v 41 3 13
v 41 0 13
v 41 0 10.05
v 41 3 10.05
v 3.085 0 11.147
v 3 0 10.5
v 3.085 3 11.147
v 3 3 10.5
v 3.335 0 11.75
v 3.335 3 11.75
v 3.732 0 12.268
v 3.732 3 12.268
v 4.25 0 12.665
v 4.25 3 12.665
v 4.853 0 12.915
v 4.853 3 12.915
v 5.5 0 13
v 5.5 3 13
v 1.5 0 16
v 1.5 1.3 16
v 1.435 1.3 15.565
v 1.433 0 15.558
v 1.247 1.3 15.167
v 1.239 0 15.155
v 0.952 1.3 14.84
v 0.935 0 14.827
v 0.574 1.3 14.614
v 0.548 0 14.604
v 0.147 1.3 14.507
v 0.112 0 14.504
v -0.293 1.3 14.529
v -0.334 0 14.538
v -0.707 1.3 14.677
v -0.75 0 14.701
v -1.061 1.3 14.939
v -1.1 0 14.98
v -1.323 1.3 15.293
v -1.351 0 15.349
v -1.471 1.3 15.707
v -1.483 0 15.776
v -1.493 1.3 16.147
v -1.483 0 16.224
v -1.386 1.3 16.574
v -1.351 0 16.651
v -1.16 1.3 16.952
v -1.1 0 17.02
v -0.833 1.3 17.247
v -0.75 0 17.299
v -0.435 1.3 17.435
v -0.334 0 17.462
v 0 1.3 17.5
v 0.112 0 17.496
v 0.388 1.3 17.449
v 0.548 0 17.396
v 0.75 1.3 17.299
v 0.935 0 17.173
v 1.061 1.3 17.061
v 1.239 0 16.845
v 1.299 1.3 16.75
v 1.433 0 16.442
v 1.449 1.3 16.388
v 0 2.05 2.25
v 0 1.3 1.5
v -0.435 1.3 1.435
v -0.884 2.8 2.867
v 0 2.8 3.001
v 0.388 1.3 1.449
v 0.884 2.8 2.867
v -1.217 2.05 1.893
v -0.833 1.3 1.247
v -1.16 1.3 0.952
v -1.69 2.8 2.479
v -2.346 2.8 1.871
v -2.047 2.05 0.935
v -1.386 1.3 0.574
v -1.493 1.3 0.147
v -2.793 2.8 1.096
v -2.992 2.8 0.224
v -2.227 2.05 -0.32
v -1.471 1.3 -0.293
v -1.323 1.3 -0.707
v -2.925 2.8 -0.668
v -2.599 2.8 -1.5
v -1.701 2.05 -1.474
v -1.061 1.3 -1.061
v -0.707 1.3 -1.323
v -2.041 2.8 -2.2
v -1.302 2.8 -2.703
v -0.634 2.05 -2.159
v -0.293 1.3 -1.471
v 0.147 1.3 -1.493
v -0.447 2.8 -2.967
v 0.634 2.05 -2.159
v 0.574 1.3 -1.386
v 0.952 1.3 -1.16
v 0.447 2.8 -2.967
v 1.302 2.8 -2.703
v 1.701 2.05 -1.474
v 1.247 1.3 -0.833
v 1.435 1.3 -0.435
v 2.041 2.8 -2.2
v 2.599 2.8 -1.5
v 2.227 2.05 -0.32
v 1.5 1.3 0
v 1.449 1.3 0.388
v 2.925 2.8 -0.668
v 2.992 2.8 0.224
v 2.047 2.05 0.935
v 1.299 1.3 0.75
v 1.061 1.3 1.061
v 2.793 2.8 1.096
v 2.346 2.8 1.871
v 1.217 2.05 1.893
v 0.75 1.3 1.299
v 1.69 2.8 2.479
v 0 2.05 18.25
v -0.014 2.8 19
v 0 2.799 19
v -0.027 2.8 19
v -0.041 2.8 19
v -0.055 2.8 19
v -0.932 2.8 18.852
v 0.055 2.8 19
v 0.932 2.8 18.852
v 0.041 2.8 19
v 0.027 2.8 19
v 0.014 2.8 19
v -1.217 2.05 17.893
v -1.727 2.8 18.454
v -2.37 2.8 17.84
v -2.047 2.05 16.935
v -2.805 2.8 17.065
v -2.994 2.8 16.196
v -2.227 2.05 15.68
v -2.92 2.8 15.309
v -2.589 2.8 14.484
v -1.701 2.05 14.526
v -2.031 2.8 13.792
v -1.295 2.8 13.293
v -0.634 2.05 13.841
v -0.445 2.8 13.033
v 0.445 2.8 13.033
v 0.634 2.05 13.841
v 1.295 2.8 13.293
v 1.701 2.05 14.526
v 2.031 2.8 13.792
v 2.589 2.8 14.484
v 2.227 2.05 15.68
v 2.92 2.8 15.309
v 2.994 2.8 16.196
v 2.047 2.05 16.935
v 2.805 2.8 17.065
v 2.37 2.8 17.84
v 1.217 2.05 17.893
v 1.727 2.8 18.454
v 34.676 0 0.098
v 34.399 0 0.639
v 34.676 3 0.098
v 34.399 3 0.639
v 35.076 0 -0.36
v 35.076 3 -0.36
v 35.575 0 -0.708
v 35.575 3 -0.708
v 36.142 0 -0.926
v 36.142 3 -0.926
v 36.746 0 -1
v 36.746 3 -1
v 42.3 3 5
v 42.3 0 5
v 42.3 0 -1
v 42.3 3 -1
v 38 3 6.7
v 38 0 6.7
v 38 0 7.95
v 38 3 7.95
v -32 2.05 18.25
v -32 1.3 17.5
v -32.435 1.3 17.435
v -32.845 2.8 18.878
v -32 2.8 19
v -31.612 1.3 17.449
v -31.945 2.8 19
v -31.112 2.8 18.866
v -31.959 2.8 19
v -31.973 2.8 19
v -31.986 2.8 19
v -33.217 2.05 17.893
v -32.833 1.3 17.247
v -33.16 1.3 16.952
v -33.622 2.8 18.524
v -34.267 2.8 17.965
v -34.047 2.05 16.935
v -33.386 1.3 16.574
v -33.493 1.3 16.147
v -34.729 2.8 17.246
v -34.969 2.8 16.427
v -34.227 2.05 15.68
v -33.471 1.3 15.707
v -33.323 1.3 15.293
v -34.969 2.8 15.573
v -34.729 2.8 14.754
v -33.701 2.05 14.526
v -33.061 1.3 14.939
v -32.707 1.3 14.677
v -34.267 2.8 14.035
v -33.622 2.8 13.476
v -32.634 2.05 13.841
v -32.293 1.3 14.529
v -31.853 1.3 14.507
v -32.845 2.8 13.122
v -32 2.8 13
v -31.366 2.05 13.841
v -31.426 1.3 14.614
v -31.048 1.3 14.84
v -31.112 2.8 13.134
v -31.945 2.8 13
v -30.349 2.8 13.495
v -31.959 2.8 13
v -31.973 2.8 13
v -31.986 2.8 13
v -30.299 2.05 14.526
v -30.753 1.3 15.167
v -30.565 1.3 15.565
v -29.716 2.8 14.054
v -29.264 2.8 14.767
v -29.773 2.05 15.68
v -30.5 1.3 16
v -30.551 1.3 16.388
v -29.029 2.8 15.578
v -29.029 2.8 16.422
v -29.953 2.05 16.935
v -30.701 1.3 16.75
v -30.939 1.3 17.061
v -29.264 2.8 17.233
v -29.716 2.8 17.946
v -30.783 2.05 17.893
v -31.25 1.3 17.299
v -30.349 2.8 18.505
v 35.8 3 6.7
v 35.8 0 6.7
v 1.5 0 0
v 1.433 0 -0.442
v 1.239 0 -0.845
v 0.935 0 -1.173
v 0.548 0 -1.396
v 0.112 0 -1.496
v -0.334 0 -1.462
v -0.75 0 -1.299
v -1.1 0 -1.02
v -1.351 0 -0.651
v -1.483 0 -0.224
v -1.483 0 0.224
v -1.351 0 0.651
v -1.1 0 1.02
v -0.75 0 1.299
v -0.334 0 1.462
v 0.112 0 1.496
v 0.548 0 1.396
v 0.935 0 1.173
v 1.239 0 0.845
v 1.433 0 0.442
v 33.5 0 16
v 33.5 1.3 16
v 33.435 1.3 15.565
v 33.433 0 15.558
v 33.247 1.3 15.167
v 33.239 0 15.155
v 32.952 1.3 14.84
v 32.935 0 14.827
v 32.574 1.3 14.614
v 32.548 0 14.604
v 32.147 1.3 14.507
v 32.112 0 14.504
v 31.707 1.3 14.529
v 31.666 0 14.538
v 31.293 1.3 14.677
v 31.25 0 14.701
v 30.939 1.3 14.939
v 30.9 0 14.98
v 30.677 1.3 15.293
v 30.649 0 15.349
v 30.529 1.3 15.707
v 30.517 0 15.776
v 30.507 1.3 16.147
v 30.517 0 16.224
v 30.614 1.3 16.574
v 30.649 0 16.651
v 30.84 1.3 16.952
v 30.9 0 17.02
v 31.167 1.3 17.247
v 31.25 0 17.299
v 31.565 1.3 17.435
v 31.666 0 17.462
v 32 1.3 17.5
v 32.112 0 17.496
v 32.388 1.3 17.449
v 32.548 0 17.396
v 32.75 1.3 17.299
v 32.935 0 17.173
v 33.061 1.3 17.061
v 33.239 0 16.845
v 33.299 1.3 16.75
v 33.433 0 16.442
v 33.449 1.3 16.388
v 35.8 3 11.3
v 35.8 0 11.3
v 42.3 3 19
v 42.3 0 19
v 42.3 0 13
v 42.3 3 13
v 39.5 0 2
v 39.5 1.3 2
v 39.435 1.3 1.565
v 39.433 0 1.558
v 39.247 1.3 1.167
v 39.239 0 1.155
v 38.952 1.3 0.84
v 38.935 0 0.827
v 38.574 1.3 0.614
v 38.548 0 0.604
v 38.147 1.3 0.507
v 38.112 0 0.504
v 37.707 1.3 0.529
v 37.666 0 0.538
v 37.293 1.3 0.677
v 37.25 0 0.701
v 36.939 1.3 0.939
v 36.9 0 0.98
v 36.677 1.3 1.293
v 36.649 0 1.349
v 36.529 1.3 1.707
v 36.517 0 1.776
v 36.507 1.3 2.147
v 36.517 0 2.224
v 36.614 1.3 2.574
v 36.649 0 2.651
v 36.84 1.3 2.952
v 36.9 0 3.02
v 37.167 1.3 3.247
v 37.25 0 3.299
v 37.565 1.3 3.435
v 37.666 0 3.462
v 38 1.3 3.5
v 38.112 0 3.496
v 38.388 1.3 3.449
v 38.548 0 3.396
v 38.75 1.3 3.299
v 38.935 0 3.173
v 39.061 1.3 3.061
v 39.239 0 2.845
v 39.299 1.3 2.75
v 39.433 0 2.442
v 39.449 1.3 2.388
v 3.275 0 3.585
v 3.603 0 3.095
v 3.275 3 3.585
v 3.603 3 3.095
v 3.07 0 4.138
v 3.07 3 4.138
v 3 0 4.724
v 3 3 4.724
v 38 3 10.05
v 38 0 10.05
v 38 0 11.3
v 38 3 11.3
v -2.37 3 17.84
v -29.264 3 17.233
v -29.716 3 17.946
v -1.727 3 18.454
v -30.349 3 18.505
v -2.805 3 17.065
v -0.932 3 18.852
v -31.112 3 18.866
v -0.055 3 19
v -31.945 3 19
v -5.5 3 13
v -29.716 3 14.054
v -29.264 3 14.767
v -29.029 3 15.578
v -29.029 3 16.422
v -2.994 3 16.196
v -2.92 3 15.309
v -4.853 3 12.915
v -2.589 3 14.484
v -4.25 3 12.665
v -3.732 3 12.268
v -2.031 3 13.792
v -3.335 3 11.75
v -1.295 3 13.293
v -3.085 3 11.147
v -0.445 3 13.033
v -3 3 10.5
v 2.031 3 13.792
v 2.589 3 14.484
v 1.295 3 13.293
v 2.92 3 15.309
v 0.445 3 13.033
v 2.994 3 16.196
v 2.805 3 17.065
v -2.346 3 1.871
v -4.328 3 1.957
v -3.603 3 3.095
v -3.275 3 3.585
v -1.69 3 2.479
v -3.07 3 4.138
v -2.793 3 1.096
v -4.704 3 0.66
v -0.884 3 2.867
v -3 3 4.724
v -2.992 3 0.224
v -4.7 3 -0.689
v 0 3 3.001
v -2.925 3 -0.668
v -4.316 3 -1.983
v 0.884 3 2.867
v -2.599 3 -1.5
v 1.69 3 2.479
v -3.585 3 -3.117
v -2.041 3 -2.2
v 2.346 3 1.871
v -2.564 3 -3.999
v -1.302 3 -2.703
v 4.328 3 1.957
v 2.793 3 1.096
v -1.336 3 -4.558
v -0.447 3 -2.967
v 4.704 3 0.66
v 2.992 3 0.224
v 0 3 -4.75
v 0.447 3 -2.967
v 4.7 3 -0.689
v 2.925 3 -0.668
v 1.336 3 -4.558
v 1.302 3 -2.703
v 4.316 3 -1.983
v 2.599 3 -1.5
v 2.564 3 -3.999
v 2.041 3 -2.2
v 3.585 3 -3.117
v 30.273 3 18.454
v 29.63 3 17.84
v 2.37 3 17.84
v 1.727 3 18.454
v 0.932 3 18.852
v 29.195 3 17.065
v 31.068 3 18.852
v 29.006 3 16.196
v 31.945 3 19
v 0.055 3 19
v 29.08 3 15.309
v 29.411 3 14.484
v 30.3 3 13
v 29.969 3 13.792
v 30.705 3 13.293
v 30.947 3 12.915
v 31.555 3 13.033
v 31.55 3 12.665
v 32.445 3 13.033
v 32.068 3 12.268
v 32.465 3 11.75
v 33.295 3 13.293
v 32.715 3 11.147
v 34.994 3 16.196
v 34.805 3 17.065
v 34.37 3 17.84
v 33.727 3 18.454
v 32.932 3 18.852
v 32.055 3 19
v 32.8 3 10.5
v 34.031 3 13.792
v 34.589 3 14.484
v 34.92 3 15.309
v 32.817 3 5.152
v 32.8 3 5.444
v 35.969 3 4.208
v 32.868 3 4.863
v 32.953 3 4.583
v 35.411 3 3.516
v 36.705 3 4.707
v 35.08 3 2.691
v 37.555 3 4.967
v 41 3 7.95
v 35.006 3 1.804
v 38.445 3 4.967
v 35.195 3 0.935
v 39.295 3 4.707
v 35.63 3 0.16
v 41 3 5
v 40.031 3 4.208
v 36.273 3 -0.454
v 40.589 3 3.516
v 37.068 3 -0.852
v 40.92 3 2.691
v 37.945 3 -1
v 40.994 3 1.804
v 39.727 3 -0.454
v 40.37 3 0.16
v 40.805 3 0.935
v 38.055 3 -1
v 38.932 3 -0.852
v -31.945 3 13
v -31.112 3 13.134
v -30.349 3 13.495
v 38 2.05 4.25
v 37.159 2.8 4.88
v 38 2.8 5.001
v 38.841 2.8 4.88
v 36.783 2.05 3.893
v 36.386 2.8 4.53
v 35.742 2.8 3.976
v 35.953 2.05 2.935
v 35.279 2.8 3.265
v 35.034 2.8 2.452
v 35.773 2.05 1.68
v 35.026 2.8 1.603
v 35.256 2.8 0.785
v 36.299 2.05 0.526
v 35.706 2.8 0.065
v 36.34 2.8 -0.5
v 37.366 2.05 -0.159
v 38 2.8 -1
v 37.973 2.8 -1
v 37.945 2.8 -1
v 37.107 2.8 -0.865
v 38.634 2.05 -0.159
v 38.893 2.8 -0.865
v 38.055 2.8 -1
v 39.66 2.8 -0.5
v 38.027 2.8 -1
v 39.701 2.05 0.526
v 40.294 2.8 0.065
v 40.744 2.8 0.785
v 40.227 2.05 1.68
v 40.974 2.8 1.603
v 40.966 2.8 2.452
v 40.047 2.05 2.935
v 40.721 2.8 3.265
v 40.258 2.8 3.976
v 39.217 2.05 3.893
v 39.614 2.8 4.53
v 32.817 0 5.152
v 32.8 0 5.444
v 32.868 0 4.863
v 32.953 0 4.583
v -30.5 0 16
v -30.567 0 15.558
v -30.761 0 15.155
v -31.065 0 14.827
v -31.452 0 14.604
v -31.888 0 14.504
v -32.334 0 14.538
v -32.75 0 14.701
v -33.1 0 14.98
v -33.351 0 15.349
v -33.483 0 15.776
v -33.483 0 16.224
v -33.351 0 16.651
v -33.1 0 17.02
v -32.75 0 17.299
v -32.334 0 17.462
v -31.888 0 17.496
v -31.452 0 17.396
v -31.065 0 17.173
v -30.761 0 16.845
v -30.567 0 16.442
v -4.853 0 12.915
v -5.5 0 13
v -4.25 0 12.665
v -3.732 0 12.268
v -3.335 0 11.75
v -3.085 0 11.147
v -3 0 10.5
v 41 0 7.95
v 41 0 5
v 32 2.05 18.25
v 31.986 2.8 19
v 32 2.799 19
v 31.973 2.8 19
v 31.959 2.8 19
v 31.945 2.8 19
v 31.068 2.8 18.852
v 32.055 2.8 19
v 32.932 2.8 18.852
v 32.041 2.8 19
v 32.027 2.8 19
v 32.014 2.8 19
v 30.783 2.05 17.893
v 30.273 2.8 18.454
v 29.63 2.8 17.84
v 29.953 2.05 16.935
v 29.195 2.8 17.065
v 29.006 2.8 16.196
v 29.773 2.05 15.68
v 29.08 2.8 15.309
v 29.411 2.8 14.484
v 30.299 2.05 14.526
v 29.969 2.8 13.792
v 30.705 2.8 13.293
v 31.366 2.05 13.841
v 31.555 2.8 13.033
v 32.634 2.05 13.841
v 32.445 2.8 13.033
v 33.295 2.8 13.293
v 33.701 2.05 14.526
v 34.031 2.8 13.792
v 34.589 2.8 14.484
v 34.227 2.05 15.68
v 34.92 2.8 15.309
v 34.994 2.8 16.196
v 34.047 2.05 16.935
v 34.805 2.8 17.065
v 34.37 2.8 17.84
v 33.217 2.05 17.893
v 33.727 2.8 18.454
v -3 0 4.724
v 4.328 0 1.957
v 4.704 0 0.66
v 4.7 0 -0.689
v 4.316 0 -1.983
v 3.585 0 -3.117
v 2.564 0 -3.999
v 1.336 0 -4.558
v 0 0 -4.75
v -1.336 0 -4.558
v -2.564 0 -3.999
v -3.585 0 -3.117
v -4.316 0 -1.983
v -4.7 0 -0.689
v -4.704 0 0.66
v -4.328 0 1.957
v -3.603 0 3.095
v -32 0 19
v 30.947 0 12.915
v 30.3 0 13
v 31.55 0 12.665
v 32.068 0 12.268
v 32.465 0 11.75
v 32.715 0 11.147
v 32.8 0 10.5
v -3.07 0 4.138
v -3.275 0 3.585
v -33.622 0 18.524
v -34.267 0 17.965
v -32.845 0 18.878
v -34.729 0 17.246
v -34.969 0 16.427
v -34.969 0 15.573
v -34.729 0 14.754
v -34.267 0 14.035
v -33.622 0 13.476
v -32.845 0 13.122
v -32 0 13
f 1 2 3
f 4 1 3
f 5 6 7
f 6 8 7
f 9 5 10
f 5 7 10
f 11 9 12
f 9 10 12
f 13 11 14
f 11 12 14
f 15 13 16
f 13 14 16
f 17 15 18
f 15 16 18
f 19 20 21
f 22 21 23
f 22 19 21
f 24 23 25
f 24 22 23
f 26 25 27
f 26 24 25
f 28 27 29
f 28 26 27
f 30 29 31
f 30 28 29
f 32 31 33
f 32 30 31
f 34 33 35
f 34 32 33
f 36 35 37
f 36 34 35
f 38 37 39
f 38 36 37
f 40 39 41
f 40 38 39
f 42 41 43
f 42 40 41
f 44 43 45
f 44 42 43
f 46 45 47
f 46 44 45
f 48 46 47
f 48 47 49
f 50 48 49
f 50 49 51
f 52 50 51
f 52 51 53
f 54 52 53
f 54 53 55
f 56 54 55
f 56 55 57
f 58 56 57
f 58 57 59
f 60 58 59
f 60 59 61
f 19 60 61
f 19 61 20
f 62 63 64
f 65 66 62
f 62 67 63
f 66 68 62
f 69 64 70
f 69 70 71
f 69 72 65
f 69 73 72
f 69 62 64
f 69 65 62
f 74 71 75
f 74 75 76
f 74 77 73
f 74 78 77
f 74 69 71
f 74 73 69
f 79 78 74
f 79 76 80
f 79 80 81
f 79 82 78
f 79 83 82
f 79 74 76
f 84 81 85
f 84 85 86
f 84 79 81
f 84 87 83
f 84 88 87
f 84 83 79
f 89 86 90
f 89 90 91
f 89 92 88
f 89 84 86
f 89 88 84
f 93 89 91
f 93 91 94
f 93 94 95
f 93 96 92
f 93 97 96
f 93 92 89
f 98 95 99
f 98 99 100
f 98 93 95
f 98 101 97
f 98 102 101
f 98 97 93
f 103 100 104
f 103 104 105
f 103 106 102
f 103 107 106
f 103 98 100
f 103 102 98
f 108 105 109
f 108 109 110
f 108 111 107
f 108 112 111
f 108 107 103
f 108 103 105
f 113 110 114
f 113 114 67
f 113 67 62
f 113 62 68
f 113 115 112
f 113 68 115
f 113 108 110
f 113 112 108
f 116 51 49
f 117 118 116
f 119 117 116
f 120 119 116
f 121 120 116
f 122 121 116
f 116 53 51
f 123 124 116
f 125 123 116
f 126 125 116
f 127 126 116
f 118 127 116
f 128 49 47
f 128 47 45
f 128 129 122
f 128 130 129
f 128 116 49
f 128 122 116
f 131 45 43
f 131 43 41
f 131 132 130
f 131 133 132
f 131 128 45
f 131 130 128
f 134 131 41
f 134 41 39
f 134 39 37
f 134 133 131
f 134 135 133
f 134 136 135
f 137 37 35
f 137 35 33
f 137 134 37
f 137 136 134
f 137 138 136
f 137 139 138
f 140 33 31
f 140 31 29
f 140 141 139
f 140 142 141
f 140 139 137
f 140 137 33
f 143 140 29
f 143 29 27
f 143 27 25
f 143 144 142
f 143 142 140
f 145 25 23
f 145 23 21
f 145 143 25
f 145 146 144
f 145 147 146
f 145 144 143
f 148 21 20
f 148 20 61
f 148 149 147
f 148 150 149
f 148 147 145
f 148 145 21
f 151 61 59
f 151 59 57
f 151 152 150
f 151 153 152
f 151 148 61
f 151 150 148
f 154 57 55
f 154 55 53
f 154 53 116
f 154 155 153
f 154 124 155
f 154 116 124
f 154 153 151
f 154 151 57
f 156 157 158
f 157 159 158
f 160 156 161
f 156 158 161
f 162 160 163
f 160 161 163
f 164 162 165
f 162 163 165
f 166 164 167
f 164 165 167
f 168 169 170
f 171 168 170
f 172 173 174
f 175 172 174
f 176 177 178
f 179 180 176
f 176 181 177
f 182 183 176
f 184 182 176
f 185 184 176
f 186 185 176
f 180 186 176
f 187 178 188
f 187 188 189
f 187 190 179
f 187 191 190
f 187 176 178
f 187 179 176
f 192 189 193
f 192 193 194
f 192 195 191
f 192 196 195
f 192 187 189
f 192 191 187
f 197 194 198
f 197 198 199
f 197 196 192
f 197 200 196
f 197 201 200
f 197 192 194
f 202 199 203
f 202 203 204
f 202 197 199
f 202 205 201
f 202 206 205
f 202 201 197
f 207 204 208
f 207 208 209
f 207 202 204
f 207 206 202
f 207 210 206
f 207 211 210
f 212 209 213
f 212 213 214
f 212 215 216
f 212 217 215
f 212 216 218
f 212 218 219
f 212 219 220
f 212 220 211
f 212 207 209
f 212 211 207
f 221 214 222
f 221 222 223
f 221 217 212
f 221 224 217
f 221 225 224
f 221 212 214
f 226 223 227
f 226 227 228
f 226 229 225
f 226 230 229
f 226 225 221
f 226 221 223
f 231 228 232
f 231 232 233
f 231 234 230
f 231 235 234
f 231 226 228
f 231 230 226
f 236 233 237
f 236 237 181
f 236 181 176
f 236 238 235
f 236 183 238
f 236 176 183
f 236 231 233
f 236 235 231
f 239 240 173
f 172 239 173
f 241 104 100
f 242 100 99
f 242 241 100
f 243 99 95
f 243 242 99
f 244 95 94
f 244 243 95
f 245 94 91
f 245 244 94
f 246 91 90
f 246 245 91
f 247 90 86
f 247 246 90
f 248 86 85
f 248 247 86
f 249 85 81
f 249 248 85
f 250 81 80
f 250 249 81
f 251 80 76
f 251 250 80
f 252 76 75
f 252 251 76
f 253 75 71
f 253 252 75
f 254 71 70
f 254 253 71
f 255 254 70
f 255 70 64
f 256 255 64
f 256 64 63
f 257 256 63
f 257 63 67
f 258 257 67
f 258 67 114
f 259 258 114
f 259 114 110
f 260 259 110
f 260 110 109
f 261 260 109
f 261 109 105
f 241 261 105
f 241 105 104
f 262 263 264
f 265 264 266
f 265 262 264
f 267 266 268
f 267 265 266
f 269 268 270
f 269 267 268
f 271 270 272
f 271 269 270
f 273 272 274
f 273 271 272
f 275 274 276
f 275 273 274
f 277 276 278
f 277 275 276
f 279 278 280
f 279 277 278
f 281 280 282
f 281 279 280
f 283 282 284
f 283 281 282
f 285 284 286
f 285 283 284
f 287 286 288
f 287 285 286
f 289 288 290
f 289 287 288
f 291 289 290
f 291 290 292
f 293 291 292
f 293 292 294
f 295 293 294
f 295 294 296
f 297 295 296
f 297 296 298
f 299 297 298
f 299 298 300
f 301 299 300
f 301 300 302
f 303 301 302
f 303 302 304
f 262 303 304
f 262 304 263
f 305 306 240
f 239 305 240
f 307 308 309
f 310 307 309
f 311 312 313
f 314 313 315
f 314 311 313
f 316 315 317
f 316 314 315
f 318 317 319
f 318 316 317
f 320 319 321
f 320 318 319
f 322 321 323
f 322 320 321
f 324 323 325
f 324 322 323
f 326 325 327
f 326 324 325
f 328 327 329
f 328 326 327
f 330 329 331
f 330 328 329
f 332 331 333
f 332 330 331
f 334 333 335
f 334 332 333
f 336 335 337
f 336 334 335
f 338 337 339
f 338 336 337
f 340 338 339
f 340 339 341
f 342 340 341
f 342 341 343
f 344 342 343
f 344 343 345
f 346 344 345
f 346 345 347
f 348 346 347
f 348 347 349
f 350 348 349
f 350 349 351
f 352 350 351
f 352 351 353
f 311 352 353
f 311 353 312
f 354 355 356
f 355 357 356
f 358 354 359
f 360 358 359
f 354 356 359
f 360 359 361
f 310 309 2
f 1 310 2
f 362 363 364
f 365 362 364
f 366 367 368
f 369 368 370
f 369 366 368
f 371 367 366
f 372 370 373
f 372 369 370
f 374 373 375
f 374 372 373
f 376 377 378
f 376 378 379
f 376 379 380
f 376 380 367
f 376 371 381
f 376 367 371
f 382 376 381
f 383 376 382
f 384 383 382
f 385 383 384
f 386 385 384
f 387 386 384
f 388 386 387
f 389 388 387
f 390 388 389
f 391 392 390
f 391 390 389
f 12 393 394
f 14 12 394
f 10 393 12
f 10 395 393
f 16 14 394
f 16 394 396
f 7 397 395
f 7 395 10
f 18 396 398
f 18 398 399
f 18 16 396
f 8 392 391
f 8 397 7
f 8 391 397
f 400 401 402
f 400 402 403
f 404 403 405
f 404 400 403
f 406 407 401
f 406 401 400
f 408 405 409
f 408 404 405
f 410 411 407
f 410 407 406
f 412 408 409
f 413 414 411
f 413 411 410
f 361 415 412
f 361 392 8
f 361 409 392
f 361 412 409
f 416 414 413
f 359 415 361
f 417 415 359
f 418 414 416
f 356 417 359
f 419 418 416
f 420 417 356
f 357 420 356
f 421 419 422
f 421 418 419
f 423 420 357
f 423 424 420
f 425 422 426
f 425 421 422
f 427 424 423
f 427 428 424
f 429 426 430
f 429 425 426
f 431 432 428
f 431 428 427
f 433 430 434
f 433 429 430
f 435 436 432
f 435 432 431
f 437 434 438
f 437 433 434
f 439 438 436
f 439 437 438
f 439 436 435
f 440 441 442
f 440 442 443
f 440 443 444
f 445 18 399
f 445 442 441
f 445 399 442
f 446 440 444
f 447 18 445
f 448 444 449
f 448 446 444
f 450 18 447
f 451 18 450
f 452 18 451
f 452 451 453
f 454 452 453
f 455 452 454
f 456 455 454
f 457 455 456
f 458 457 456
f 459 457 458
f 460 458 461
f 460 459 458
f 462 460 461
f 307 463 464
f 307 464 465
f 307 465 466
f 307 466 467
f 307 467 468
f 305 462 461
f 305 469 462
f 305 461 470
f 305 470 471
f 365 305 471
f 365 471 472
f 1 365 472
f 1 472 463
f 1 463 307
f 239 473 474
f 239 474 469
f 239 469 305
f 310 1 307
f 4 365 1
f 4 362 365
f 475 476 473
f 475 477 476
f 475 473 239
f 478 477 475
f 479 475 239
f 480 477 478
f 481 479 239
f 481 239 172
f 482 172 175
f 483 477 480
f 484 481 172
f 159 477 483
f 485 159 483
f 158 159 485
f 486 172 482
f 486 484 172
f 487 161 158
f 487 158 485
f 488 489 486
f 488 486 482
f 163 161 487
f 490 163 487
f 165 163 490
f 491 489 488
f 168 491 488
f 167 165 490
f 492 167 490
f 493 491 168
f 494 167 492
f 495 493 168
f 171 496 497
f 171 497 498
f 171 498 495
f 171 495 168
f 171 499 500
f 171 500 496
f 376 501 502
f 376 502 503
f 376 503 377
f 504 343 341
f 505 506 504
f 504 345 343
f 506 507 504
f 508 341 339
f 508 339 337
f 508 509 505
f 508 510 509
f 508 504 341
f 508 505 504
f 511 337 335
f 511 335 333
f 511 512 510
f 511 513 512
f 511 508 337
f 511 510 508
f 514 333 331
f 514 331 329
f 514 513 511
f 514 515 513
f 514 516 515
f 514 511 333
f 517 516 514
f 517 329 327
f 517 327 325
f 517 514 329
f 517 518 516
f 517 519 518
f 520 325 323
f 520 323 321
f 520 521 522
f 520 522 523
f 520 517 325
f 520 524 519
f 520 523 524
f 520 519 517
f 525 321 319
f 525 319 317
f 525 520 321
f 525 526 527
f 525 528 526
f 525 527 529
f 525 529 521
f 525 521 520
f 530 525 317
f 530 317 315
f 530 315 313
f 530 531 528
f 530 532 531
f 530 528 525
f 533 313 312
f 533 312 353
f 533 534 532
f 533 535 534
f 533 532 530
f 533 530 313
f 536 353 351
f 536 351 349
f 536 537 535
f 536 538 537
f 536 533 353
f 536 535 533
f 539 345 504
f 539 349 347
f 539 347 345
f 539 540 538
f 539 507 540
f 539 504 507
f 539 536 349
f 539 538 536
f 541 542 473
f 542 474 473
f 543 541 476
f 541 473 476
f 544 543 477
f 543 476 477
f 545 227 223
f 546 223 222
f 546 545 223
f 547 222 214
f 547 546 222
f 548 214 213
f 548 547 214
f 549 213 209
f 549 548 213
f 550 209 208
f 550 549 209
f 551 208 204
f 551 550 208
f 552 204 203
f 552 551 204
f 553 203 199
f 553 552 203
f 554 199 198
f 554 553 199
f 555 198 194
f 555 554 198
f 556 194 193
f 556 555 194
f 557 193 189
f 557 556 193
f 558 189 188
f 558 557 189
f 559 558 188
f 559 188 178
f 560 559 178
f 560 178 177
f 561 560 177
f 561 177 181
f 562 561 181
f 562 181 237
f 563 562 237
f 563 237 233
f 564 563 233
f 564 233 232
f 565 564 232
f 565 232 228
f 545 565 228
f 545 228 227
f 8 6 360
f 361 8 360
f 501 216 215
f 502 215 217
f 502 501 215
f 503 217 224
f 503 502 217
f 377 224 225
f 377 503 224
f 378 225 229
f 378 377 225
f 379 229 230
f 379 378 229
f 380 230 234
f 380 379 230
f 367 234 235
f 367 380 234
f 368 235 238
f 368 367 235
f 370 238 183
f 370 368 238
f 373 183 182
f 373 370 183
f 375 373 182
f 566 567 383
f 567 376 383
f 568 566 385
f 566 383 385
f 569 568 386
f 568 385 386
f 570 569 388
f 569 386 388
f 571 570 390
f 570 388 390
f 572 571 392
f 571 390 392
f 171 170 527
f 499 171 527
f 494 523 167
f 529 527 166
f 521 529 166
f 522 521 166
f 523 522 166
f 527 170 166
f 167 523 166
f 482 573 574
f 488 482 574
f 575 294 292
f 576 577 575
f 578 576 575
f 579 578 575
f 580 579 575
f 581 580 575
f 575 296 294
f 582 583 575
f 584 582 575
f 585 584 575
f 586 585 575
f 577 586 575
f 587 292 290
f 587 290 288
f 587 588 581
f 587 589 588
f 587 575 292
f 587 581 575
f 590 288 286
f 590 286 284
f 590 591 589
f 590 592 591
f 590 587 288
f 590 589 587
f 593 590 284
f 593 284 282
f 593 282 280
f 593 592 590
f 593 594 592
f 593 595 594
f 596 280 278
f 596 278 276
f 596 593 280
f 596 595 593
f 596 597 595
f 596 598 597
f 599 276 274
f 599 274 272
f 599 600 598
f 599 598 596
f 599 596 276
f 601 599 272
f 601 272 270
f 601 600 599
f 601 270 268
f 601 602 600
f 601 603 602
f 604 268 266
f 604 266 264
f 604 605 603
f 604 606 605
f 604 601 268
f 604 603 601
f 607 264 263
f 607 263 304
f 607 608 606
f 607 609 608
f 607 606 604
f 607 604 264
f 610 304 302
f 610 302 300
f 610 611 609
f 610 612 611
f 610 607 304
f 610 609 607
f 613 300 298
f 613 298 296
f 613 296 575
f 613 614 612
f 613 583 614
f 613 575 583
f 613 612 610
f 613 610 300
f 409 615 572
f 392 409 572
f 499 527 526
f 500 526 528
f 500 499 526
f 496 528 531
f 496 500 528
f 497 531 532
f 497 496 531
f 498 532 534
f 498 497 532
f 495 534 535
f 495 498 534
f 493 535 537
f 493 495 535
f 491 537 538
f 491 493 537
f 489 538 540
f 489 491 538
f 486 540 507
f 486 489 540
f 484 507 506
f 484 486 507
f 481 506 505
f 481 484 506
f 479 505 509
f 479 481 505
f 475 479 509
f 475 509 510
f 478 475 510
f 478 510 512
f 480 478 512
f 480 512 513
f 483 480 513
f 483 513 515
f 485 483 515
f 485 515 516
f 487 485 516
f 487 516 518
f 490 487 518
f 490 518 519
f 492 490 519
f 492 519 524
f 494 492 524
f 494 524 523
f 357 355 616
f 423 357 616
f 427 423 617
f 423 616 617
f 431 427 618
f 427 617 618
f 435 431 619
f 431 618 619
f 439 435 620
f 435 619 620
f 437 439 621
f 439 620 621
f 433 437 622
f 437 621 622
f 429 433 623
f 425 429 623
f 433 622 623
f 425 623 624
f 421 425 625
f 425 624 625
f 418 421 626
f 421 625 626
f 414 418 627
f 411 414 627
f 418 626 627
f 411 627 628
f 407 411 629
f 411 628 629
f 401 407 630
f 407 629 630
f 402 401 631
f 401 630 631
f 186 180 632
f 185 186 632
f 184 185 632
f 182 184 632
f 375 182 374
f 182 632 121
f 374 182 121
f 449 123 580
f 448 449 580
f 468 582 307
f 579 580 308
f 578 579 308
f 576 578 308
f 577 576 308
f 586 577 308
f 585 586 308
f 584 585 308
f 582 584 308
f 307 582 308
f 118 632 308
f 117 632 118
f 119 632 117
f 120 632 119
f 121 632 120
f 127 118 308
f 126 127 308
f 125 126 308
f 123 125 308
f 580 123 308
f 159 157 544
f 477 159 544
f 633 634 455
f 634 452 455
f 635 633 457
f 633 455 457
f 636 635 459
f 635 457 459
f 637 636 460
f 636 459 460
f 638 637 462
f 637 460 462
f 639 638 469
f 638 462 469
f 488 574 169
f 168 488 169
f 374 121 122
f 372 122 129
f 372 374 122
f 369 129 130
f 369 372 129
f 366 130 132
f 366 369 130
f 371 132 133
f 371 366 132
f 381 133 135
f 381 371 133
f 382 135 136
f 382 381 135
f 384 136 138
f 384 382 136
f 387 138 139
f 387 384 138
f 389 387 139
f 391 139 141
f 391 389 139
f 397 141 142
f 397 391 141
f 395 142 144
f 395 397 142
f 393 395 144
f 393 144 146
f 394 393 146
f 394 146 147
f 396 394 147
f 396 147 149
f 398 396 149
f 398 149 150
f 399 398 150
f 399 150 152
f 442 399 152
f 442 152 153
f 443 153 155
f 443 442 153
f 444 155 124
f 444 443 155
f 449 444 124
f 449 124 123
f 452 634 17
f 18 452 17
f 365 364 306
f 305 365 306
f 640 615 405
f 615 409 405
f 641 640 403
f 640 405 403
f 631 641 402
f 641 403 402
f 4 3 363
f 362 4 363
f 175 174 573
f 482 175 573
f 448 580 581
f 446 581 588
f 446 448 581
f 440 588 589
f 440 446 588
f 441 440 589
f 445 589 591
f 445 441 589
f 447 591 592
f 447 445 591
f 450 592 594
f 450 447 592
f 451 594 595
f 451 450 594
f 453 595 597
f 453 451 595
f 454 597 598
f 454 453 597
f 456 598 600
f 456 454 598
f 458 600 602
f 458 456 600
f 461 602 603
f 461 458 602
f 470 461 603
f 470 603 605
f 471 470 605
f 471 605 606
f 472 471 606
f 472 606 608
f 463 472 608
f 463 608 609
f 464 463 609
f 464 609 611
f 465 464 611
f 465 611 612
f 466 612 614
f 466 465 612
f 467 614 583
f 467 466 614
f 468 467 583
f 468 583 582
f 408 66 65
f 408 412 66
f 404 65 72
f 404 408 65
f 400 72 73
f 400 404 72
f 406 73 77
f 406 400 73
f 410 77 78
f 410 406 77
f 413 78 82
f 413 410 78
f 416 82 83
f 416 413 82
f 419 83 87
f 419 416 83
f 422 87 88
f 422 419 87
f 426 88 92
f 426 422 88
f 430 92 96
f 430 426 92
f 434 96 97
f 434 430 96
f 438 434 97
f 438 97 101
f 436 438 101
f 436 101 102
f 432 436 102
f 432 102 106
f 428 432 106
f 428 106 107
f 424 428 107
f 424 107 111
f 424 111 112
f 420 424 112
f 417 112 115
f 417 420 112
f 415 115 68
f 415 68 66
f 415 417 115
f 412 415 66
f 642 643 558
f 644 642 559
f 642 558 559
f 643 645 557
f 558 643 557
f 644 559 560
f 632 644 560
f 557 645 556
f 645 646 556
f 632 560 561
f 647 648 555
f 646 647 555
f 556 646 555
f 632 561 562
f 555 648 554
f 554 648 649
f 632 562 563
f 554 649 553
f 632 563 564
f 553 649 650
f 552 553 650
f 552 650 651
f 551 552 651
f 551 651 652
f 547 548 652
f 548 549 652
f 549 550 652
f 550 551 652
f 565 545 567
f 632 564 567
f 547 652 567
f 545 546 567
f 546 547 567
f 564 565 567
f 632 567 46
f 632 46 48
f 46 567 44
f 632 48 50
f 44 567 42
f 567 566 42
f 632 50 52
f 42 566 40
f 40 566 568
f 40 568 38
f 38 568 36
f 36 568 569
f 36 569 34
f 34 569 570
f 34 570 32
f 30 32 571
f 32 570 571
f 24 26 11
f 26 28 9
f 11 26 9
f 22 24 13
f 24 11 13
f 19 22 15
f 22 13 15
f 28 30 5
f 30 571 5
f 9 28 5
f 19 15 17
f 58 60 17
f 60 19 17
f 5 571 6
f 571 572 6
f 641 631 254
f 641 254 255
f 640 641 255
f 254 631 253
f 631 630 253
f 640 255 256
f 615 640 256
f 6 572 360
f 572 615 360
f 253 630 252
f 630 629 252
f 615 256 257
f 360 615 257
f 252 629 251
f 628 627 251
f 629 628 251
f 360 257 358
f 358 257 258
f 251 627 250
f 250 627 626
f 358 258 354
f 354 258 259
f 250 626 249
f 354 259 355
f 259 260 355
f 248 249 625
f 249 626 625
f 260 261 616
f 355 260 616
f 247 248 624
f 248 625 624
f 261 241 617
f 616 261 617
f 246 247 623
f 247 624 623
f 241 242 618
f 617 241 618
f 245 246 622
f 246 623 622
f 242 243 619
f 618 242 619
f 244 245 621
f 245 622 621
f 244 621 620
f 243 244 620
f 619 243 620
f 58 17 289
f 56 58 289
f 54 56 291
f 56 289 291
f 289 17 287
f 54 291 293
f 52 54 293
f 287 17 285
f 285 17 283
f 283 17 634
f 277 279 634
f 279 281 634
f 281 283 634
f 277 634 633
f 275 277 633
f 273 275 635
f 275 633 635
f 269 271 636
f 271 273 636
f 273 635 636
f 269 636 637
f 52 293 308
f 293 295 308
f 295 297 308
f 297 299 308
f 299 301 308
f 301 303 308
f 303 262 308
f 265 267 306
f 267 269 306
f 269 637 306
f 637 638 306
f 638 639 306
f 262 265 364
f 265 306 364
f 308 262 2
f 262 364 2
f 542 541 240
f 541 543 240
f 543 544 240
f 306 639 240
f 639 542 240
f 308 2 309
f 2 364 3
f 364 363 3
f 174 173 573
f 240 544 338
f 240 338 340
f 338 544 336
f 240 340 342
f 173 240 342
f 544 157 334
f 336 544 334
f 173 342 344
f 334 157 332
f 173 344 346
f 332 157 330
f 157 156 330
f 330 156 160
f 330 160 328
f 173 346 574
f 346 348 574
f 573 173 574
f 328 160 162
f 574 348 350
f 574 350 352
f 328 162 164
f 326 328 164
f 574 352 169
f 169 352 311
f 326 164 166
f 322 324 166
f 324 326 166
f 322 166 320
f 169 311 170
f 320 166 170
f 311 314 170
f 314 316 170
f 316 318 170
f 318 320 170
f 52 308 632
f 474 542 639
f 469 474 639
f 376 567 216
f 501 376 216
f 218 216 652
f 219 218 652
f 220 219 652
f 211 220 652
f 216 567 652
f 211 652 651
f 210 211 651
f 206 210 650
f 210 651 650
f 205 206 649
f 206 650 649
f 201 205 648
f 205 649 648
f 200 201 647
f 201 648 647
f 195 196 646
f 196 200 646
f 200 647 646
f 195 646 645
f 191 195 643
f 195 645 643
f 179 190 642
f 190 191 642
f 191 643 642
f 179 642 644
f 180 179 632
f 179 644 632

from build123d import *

# Parameters (mm, degrees)
SKETCH1_R                                      = 1.5
BOSS_EXTRUDE1_DEPTH                            = 3
FILLET1_R                                      = 2.5
CSK_FOR_M3_FLAT_HEAD_MACHINE_SCREW3_AT_2_COUNT = 2
CSK_FOR_M3_FLAT_HEAD_MACHINE_SCREW3_AT_2_PITCH = 32
CSK_FOR_M3_FLAT_HEAD_MACHINE_SCREW3_AT_3_COUNT = 2
CSK_FOR_M3_FLAT_HEAD_MACHINE_SCREW3_AT_3_PITCH = 71.38627319
CSK_FOR_M3_FLAT_HEAD_MACHINE_SCREW3_AT_4_COUNT = 2
CSK_FOR_M3_FLAT_HEAD_MACHINE_SCREW3_AT_4_PITCH = 35.77708764
CSK_FOR_M3_FLAT_HEAD_MACHINE_SCREW3_AT_5_COUNT = 2
CSK_FOR_M3_FLAT_HEAD_MACHINE_SCREW3_AT_5_PITCH = 64


with BuildPart() as part:
    # Sketch1 → Boss-Extrude1 (new body)
    with BuildSketch(Plane(origin=(0, 0, 0), x_dir=(1, 0, 0), z_dir=(0, 1, 0))):
        with BuildLine():
            Line((-3, -13), (-32, -13))
            ThreePointArc((-32, -13), (-35, -16), (-32, -19))
            Line((-32, -19), (42.3, -19))
            Line((42.3, -19), (42.3, -13))
            Line((42.3, -13), (41, -13))
            Line((41, -13), (41, -10.05))
            Line((41, -10.05), (38, -10.05))
            Line((38, -10.05), (38, -11.3))
            Line((38, -11.3), (35.8, -11.3))
            Line((35.8, -11.3), (35.8, -6.7))
            Line((35.8, -6.7), (38, -6.7))
            Line((38, -6.7), (38, -7.95))
            Line((38, -7.95), (41, -7.95))
            Line((41, -7.95), (41, -5))
            Line((41, -5), (42.3, -5))
            Line((42.3, -5), (42.3, 1))
            Line((42.3, 1), (35, 1))
            Line((35, 1), (32.8, -5))
            Line((32.8, -5), (32.8, -13))
            Line((32.8, -13), (3, -13))
            Line((3, -13), (3, -3.682729966))
            ThreePointArc((3, -3.682729966), (0, 4.75), (-3, -3.682729966))
            Line((-3, -3.682729966), (-3, -13))
        make_face()
        with Locations((32, -16)):
            Circle(SKETCH1_R, mode=Mode.SUBTRACT)
        with Locations((0, -16)):
            Circle(SKETCH1_R, mode=Mode.SUBTRACT)
        with Locations((-32, -16)):
            Circle(SKETCH1_R, mode=Mode.SUBTRACT)
        Circle(SKETCH1_R, mode=Mode.SUBTRACT)
        with Locations((38, -2)):
            Circle(SKETCH1_R, mode=Mode.SUBTRACT)
    extrude(amount=BOSS_EXTRUDE1_DEPTH)

    # Fillet1
    fillet1_edges = [part.edges().sort_by_distance(p)[0] for p in [
        (35, 1.5, -1),
        (32.8, 1.5, 5),
        (32.8, 1.5, 13),
        (3, 1.5, 13),
        (-3, 1.5, 13),
        (-3, 1.5, 3.682729966),
        (3, 1.5, 3.682729966),
    ]]
    fillet(fillet1_edges, radius=FILLET1_R)

    # Sketch5 → CSK for M3 Flat Head Machine Screw3 (revolve, cut)
    with BuildSketch(Plane(origin=(-32, 3, 16), x_dir=(0, 0, 1), z_dir=(1, 0, 0))):
        Polygon((0, 0), (0, 3), (1.5, 3), (1.5, 1.7005), (3.0005, 0.2), (3.0005, 0), align=None)
    csk_for_m3_flat_head_machine_screw3 = revolve(axis=Axis((-32, 9.35, 16), (0, -1, 0)), mode=Mode.SUBTRACT)

    # CSK for M3 Flat Head Machine Screw3 at 2: CSK for M3 Flat Head Machine Screw3 ×2
    with Locations(*[(i * CSK_FOR_M3_FLAT_HEAD_MACHINE_SCREW3_AT_2_PITCH, 0, 0) for i in range(1, CSK_FOR_M3_FLAT_HEAD_MACHINE_SCREW3_AT_2_COUNT)]):
        add(csk_for_m3_flat_head_machine_screw3, mode=Mode.SUBTRACT)

    # CSK for M3 Flat Head Machine Screw3 at 3: CSK for M3 Flat Head Machine Screw3 ×2
    with Locations(*[Vector(0.9805806756909202, 0, -0.1961161351381841) * (i * CSK_FOR_M3_FLAT_HEAD_MACHINE_SCREW3_AT_3_PITCH) for i in range(1, CSK_FOR_M3_FLAT_HEAD_MACHINE_SCREW3_AT_3_COUNT)]):
        add(csk_for_m3_flat_head_machine_screw3, mode=Mode.SUBTRACT)

    # CSK for M3 Flat Head Machine Screw3 at 4: CSK for M3 Flat Head Machine Screw3 ×2
    with Locations(*[Vector(0.8944271909999157, 0, -0.44721359549995826) * (i * CSK_FOR_M3_FLAT_HEAD_MACHINE_SCREW3_AT_4_PITCH) for i in range(1, CSK_FOR_M3_FLAT_HEAD_MACHINE_SCREW3_AT_4_COUNT)]):
        add(csk_for_m3_flat_head_machine_screw3, mode=Mode.SUBTRACT)

    # CSK for M3 Flat Head Machine Screw3 at 5: CSK for M3 Flat Head Machine Screw3 ×2
    with Locations(*[(i * CSK_FOR_M3_FLAT_HEAD_MACHINE_SCREW3_AT_5_PITCH, 0, 0) for i in range(1, CSK_FOR_M3_FLAT_HEAD_MACHINE_SCREW3_AT_5_COUNT)]):
        add(csk_for_m3_flat_head_machine_screw3, mode=Mode.SUBTRACT)


solid = part.part
